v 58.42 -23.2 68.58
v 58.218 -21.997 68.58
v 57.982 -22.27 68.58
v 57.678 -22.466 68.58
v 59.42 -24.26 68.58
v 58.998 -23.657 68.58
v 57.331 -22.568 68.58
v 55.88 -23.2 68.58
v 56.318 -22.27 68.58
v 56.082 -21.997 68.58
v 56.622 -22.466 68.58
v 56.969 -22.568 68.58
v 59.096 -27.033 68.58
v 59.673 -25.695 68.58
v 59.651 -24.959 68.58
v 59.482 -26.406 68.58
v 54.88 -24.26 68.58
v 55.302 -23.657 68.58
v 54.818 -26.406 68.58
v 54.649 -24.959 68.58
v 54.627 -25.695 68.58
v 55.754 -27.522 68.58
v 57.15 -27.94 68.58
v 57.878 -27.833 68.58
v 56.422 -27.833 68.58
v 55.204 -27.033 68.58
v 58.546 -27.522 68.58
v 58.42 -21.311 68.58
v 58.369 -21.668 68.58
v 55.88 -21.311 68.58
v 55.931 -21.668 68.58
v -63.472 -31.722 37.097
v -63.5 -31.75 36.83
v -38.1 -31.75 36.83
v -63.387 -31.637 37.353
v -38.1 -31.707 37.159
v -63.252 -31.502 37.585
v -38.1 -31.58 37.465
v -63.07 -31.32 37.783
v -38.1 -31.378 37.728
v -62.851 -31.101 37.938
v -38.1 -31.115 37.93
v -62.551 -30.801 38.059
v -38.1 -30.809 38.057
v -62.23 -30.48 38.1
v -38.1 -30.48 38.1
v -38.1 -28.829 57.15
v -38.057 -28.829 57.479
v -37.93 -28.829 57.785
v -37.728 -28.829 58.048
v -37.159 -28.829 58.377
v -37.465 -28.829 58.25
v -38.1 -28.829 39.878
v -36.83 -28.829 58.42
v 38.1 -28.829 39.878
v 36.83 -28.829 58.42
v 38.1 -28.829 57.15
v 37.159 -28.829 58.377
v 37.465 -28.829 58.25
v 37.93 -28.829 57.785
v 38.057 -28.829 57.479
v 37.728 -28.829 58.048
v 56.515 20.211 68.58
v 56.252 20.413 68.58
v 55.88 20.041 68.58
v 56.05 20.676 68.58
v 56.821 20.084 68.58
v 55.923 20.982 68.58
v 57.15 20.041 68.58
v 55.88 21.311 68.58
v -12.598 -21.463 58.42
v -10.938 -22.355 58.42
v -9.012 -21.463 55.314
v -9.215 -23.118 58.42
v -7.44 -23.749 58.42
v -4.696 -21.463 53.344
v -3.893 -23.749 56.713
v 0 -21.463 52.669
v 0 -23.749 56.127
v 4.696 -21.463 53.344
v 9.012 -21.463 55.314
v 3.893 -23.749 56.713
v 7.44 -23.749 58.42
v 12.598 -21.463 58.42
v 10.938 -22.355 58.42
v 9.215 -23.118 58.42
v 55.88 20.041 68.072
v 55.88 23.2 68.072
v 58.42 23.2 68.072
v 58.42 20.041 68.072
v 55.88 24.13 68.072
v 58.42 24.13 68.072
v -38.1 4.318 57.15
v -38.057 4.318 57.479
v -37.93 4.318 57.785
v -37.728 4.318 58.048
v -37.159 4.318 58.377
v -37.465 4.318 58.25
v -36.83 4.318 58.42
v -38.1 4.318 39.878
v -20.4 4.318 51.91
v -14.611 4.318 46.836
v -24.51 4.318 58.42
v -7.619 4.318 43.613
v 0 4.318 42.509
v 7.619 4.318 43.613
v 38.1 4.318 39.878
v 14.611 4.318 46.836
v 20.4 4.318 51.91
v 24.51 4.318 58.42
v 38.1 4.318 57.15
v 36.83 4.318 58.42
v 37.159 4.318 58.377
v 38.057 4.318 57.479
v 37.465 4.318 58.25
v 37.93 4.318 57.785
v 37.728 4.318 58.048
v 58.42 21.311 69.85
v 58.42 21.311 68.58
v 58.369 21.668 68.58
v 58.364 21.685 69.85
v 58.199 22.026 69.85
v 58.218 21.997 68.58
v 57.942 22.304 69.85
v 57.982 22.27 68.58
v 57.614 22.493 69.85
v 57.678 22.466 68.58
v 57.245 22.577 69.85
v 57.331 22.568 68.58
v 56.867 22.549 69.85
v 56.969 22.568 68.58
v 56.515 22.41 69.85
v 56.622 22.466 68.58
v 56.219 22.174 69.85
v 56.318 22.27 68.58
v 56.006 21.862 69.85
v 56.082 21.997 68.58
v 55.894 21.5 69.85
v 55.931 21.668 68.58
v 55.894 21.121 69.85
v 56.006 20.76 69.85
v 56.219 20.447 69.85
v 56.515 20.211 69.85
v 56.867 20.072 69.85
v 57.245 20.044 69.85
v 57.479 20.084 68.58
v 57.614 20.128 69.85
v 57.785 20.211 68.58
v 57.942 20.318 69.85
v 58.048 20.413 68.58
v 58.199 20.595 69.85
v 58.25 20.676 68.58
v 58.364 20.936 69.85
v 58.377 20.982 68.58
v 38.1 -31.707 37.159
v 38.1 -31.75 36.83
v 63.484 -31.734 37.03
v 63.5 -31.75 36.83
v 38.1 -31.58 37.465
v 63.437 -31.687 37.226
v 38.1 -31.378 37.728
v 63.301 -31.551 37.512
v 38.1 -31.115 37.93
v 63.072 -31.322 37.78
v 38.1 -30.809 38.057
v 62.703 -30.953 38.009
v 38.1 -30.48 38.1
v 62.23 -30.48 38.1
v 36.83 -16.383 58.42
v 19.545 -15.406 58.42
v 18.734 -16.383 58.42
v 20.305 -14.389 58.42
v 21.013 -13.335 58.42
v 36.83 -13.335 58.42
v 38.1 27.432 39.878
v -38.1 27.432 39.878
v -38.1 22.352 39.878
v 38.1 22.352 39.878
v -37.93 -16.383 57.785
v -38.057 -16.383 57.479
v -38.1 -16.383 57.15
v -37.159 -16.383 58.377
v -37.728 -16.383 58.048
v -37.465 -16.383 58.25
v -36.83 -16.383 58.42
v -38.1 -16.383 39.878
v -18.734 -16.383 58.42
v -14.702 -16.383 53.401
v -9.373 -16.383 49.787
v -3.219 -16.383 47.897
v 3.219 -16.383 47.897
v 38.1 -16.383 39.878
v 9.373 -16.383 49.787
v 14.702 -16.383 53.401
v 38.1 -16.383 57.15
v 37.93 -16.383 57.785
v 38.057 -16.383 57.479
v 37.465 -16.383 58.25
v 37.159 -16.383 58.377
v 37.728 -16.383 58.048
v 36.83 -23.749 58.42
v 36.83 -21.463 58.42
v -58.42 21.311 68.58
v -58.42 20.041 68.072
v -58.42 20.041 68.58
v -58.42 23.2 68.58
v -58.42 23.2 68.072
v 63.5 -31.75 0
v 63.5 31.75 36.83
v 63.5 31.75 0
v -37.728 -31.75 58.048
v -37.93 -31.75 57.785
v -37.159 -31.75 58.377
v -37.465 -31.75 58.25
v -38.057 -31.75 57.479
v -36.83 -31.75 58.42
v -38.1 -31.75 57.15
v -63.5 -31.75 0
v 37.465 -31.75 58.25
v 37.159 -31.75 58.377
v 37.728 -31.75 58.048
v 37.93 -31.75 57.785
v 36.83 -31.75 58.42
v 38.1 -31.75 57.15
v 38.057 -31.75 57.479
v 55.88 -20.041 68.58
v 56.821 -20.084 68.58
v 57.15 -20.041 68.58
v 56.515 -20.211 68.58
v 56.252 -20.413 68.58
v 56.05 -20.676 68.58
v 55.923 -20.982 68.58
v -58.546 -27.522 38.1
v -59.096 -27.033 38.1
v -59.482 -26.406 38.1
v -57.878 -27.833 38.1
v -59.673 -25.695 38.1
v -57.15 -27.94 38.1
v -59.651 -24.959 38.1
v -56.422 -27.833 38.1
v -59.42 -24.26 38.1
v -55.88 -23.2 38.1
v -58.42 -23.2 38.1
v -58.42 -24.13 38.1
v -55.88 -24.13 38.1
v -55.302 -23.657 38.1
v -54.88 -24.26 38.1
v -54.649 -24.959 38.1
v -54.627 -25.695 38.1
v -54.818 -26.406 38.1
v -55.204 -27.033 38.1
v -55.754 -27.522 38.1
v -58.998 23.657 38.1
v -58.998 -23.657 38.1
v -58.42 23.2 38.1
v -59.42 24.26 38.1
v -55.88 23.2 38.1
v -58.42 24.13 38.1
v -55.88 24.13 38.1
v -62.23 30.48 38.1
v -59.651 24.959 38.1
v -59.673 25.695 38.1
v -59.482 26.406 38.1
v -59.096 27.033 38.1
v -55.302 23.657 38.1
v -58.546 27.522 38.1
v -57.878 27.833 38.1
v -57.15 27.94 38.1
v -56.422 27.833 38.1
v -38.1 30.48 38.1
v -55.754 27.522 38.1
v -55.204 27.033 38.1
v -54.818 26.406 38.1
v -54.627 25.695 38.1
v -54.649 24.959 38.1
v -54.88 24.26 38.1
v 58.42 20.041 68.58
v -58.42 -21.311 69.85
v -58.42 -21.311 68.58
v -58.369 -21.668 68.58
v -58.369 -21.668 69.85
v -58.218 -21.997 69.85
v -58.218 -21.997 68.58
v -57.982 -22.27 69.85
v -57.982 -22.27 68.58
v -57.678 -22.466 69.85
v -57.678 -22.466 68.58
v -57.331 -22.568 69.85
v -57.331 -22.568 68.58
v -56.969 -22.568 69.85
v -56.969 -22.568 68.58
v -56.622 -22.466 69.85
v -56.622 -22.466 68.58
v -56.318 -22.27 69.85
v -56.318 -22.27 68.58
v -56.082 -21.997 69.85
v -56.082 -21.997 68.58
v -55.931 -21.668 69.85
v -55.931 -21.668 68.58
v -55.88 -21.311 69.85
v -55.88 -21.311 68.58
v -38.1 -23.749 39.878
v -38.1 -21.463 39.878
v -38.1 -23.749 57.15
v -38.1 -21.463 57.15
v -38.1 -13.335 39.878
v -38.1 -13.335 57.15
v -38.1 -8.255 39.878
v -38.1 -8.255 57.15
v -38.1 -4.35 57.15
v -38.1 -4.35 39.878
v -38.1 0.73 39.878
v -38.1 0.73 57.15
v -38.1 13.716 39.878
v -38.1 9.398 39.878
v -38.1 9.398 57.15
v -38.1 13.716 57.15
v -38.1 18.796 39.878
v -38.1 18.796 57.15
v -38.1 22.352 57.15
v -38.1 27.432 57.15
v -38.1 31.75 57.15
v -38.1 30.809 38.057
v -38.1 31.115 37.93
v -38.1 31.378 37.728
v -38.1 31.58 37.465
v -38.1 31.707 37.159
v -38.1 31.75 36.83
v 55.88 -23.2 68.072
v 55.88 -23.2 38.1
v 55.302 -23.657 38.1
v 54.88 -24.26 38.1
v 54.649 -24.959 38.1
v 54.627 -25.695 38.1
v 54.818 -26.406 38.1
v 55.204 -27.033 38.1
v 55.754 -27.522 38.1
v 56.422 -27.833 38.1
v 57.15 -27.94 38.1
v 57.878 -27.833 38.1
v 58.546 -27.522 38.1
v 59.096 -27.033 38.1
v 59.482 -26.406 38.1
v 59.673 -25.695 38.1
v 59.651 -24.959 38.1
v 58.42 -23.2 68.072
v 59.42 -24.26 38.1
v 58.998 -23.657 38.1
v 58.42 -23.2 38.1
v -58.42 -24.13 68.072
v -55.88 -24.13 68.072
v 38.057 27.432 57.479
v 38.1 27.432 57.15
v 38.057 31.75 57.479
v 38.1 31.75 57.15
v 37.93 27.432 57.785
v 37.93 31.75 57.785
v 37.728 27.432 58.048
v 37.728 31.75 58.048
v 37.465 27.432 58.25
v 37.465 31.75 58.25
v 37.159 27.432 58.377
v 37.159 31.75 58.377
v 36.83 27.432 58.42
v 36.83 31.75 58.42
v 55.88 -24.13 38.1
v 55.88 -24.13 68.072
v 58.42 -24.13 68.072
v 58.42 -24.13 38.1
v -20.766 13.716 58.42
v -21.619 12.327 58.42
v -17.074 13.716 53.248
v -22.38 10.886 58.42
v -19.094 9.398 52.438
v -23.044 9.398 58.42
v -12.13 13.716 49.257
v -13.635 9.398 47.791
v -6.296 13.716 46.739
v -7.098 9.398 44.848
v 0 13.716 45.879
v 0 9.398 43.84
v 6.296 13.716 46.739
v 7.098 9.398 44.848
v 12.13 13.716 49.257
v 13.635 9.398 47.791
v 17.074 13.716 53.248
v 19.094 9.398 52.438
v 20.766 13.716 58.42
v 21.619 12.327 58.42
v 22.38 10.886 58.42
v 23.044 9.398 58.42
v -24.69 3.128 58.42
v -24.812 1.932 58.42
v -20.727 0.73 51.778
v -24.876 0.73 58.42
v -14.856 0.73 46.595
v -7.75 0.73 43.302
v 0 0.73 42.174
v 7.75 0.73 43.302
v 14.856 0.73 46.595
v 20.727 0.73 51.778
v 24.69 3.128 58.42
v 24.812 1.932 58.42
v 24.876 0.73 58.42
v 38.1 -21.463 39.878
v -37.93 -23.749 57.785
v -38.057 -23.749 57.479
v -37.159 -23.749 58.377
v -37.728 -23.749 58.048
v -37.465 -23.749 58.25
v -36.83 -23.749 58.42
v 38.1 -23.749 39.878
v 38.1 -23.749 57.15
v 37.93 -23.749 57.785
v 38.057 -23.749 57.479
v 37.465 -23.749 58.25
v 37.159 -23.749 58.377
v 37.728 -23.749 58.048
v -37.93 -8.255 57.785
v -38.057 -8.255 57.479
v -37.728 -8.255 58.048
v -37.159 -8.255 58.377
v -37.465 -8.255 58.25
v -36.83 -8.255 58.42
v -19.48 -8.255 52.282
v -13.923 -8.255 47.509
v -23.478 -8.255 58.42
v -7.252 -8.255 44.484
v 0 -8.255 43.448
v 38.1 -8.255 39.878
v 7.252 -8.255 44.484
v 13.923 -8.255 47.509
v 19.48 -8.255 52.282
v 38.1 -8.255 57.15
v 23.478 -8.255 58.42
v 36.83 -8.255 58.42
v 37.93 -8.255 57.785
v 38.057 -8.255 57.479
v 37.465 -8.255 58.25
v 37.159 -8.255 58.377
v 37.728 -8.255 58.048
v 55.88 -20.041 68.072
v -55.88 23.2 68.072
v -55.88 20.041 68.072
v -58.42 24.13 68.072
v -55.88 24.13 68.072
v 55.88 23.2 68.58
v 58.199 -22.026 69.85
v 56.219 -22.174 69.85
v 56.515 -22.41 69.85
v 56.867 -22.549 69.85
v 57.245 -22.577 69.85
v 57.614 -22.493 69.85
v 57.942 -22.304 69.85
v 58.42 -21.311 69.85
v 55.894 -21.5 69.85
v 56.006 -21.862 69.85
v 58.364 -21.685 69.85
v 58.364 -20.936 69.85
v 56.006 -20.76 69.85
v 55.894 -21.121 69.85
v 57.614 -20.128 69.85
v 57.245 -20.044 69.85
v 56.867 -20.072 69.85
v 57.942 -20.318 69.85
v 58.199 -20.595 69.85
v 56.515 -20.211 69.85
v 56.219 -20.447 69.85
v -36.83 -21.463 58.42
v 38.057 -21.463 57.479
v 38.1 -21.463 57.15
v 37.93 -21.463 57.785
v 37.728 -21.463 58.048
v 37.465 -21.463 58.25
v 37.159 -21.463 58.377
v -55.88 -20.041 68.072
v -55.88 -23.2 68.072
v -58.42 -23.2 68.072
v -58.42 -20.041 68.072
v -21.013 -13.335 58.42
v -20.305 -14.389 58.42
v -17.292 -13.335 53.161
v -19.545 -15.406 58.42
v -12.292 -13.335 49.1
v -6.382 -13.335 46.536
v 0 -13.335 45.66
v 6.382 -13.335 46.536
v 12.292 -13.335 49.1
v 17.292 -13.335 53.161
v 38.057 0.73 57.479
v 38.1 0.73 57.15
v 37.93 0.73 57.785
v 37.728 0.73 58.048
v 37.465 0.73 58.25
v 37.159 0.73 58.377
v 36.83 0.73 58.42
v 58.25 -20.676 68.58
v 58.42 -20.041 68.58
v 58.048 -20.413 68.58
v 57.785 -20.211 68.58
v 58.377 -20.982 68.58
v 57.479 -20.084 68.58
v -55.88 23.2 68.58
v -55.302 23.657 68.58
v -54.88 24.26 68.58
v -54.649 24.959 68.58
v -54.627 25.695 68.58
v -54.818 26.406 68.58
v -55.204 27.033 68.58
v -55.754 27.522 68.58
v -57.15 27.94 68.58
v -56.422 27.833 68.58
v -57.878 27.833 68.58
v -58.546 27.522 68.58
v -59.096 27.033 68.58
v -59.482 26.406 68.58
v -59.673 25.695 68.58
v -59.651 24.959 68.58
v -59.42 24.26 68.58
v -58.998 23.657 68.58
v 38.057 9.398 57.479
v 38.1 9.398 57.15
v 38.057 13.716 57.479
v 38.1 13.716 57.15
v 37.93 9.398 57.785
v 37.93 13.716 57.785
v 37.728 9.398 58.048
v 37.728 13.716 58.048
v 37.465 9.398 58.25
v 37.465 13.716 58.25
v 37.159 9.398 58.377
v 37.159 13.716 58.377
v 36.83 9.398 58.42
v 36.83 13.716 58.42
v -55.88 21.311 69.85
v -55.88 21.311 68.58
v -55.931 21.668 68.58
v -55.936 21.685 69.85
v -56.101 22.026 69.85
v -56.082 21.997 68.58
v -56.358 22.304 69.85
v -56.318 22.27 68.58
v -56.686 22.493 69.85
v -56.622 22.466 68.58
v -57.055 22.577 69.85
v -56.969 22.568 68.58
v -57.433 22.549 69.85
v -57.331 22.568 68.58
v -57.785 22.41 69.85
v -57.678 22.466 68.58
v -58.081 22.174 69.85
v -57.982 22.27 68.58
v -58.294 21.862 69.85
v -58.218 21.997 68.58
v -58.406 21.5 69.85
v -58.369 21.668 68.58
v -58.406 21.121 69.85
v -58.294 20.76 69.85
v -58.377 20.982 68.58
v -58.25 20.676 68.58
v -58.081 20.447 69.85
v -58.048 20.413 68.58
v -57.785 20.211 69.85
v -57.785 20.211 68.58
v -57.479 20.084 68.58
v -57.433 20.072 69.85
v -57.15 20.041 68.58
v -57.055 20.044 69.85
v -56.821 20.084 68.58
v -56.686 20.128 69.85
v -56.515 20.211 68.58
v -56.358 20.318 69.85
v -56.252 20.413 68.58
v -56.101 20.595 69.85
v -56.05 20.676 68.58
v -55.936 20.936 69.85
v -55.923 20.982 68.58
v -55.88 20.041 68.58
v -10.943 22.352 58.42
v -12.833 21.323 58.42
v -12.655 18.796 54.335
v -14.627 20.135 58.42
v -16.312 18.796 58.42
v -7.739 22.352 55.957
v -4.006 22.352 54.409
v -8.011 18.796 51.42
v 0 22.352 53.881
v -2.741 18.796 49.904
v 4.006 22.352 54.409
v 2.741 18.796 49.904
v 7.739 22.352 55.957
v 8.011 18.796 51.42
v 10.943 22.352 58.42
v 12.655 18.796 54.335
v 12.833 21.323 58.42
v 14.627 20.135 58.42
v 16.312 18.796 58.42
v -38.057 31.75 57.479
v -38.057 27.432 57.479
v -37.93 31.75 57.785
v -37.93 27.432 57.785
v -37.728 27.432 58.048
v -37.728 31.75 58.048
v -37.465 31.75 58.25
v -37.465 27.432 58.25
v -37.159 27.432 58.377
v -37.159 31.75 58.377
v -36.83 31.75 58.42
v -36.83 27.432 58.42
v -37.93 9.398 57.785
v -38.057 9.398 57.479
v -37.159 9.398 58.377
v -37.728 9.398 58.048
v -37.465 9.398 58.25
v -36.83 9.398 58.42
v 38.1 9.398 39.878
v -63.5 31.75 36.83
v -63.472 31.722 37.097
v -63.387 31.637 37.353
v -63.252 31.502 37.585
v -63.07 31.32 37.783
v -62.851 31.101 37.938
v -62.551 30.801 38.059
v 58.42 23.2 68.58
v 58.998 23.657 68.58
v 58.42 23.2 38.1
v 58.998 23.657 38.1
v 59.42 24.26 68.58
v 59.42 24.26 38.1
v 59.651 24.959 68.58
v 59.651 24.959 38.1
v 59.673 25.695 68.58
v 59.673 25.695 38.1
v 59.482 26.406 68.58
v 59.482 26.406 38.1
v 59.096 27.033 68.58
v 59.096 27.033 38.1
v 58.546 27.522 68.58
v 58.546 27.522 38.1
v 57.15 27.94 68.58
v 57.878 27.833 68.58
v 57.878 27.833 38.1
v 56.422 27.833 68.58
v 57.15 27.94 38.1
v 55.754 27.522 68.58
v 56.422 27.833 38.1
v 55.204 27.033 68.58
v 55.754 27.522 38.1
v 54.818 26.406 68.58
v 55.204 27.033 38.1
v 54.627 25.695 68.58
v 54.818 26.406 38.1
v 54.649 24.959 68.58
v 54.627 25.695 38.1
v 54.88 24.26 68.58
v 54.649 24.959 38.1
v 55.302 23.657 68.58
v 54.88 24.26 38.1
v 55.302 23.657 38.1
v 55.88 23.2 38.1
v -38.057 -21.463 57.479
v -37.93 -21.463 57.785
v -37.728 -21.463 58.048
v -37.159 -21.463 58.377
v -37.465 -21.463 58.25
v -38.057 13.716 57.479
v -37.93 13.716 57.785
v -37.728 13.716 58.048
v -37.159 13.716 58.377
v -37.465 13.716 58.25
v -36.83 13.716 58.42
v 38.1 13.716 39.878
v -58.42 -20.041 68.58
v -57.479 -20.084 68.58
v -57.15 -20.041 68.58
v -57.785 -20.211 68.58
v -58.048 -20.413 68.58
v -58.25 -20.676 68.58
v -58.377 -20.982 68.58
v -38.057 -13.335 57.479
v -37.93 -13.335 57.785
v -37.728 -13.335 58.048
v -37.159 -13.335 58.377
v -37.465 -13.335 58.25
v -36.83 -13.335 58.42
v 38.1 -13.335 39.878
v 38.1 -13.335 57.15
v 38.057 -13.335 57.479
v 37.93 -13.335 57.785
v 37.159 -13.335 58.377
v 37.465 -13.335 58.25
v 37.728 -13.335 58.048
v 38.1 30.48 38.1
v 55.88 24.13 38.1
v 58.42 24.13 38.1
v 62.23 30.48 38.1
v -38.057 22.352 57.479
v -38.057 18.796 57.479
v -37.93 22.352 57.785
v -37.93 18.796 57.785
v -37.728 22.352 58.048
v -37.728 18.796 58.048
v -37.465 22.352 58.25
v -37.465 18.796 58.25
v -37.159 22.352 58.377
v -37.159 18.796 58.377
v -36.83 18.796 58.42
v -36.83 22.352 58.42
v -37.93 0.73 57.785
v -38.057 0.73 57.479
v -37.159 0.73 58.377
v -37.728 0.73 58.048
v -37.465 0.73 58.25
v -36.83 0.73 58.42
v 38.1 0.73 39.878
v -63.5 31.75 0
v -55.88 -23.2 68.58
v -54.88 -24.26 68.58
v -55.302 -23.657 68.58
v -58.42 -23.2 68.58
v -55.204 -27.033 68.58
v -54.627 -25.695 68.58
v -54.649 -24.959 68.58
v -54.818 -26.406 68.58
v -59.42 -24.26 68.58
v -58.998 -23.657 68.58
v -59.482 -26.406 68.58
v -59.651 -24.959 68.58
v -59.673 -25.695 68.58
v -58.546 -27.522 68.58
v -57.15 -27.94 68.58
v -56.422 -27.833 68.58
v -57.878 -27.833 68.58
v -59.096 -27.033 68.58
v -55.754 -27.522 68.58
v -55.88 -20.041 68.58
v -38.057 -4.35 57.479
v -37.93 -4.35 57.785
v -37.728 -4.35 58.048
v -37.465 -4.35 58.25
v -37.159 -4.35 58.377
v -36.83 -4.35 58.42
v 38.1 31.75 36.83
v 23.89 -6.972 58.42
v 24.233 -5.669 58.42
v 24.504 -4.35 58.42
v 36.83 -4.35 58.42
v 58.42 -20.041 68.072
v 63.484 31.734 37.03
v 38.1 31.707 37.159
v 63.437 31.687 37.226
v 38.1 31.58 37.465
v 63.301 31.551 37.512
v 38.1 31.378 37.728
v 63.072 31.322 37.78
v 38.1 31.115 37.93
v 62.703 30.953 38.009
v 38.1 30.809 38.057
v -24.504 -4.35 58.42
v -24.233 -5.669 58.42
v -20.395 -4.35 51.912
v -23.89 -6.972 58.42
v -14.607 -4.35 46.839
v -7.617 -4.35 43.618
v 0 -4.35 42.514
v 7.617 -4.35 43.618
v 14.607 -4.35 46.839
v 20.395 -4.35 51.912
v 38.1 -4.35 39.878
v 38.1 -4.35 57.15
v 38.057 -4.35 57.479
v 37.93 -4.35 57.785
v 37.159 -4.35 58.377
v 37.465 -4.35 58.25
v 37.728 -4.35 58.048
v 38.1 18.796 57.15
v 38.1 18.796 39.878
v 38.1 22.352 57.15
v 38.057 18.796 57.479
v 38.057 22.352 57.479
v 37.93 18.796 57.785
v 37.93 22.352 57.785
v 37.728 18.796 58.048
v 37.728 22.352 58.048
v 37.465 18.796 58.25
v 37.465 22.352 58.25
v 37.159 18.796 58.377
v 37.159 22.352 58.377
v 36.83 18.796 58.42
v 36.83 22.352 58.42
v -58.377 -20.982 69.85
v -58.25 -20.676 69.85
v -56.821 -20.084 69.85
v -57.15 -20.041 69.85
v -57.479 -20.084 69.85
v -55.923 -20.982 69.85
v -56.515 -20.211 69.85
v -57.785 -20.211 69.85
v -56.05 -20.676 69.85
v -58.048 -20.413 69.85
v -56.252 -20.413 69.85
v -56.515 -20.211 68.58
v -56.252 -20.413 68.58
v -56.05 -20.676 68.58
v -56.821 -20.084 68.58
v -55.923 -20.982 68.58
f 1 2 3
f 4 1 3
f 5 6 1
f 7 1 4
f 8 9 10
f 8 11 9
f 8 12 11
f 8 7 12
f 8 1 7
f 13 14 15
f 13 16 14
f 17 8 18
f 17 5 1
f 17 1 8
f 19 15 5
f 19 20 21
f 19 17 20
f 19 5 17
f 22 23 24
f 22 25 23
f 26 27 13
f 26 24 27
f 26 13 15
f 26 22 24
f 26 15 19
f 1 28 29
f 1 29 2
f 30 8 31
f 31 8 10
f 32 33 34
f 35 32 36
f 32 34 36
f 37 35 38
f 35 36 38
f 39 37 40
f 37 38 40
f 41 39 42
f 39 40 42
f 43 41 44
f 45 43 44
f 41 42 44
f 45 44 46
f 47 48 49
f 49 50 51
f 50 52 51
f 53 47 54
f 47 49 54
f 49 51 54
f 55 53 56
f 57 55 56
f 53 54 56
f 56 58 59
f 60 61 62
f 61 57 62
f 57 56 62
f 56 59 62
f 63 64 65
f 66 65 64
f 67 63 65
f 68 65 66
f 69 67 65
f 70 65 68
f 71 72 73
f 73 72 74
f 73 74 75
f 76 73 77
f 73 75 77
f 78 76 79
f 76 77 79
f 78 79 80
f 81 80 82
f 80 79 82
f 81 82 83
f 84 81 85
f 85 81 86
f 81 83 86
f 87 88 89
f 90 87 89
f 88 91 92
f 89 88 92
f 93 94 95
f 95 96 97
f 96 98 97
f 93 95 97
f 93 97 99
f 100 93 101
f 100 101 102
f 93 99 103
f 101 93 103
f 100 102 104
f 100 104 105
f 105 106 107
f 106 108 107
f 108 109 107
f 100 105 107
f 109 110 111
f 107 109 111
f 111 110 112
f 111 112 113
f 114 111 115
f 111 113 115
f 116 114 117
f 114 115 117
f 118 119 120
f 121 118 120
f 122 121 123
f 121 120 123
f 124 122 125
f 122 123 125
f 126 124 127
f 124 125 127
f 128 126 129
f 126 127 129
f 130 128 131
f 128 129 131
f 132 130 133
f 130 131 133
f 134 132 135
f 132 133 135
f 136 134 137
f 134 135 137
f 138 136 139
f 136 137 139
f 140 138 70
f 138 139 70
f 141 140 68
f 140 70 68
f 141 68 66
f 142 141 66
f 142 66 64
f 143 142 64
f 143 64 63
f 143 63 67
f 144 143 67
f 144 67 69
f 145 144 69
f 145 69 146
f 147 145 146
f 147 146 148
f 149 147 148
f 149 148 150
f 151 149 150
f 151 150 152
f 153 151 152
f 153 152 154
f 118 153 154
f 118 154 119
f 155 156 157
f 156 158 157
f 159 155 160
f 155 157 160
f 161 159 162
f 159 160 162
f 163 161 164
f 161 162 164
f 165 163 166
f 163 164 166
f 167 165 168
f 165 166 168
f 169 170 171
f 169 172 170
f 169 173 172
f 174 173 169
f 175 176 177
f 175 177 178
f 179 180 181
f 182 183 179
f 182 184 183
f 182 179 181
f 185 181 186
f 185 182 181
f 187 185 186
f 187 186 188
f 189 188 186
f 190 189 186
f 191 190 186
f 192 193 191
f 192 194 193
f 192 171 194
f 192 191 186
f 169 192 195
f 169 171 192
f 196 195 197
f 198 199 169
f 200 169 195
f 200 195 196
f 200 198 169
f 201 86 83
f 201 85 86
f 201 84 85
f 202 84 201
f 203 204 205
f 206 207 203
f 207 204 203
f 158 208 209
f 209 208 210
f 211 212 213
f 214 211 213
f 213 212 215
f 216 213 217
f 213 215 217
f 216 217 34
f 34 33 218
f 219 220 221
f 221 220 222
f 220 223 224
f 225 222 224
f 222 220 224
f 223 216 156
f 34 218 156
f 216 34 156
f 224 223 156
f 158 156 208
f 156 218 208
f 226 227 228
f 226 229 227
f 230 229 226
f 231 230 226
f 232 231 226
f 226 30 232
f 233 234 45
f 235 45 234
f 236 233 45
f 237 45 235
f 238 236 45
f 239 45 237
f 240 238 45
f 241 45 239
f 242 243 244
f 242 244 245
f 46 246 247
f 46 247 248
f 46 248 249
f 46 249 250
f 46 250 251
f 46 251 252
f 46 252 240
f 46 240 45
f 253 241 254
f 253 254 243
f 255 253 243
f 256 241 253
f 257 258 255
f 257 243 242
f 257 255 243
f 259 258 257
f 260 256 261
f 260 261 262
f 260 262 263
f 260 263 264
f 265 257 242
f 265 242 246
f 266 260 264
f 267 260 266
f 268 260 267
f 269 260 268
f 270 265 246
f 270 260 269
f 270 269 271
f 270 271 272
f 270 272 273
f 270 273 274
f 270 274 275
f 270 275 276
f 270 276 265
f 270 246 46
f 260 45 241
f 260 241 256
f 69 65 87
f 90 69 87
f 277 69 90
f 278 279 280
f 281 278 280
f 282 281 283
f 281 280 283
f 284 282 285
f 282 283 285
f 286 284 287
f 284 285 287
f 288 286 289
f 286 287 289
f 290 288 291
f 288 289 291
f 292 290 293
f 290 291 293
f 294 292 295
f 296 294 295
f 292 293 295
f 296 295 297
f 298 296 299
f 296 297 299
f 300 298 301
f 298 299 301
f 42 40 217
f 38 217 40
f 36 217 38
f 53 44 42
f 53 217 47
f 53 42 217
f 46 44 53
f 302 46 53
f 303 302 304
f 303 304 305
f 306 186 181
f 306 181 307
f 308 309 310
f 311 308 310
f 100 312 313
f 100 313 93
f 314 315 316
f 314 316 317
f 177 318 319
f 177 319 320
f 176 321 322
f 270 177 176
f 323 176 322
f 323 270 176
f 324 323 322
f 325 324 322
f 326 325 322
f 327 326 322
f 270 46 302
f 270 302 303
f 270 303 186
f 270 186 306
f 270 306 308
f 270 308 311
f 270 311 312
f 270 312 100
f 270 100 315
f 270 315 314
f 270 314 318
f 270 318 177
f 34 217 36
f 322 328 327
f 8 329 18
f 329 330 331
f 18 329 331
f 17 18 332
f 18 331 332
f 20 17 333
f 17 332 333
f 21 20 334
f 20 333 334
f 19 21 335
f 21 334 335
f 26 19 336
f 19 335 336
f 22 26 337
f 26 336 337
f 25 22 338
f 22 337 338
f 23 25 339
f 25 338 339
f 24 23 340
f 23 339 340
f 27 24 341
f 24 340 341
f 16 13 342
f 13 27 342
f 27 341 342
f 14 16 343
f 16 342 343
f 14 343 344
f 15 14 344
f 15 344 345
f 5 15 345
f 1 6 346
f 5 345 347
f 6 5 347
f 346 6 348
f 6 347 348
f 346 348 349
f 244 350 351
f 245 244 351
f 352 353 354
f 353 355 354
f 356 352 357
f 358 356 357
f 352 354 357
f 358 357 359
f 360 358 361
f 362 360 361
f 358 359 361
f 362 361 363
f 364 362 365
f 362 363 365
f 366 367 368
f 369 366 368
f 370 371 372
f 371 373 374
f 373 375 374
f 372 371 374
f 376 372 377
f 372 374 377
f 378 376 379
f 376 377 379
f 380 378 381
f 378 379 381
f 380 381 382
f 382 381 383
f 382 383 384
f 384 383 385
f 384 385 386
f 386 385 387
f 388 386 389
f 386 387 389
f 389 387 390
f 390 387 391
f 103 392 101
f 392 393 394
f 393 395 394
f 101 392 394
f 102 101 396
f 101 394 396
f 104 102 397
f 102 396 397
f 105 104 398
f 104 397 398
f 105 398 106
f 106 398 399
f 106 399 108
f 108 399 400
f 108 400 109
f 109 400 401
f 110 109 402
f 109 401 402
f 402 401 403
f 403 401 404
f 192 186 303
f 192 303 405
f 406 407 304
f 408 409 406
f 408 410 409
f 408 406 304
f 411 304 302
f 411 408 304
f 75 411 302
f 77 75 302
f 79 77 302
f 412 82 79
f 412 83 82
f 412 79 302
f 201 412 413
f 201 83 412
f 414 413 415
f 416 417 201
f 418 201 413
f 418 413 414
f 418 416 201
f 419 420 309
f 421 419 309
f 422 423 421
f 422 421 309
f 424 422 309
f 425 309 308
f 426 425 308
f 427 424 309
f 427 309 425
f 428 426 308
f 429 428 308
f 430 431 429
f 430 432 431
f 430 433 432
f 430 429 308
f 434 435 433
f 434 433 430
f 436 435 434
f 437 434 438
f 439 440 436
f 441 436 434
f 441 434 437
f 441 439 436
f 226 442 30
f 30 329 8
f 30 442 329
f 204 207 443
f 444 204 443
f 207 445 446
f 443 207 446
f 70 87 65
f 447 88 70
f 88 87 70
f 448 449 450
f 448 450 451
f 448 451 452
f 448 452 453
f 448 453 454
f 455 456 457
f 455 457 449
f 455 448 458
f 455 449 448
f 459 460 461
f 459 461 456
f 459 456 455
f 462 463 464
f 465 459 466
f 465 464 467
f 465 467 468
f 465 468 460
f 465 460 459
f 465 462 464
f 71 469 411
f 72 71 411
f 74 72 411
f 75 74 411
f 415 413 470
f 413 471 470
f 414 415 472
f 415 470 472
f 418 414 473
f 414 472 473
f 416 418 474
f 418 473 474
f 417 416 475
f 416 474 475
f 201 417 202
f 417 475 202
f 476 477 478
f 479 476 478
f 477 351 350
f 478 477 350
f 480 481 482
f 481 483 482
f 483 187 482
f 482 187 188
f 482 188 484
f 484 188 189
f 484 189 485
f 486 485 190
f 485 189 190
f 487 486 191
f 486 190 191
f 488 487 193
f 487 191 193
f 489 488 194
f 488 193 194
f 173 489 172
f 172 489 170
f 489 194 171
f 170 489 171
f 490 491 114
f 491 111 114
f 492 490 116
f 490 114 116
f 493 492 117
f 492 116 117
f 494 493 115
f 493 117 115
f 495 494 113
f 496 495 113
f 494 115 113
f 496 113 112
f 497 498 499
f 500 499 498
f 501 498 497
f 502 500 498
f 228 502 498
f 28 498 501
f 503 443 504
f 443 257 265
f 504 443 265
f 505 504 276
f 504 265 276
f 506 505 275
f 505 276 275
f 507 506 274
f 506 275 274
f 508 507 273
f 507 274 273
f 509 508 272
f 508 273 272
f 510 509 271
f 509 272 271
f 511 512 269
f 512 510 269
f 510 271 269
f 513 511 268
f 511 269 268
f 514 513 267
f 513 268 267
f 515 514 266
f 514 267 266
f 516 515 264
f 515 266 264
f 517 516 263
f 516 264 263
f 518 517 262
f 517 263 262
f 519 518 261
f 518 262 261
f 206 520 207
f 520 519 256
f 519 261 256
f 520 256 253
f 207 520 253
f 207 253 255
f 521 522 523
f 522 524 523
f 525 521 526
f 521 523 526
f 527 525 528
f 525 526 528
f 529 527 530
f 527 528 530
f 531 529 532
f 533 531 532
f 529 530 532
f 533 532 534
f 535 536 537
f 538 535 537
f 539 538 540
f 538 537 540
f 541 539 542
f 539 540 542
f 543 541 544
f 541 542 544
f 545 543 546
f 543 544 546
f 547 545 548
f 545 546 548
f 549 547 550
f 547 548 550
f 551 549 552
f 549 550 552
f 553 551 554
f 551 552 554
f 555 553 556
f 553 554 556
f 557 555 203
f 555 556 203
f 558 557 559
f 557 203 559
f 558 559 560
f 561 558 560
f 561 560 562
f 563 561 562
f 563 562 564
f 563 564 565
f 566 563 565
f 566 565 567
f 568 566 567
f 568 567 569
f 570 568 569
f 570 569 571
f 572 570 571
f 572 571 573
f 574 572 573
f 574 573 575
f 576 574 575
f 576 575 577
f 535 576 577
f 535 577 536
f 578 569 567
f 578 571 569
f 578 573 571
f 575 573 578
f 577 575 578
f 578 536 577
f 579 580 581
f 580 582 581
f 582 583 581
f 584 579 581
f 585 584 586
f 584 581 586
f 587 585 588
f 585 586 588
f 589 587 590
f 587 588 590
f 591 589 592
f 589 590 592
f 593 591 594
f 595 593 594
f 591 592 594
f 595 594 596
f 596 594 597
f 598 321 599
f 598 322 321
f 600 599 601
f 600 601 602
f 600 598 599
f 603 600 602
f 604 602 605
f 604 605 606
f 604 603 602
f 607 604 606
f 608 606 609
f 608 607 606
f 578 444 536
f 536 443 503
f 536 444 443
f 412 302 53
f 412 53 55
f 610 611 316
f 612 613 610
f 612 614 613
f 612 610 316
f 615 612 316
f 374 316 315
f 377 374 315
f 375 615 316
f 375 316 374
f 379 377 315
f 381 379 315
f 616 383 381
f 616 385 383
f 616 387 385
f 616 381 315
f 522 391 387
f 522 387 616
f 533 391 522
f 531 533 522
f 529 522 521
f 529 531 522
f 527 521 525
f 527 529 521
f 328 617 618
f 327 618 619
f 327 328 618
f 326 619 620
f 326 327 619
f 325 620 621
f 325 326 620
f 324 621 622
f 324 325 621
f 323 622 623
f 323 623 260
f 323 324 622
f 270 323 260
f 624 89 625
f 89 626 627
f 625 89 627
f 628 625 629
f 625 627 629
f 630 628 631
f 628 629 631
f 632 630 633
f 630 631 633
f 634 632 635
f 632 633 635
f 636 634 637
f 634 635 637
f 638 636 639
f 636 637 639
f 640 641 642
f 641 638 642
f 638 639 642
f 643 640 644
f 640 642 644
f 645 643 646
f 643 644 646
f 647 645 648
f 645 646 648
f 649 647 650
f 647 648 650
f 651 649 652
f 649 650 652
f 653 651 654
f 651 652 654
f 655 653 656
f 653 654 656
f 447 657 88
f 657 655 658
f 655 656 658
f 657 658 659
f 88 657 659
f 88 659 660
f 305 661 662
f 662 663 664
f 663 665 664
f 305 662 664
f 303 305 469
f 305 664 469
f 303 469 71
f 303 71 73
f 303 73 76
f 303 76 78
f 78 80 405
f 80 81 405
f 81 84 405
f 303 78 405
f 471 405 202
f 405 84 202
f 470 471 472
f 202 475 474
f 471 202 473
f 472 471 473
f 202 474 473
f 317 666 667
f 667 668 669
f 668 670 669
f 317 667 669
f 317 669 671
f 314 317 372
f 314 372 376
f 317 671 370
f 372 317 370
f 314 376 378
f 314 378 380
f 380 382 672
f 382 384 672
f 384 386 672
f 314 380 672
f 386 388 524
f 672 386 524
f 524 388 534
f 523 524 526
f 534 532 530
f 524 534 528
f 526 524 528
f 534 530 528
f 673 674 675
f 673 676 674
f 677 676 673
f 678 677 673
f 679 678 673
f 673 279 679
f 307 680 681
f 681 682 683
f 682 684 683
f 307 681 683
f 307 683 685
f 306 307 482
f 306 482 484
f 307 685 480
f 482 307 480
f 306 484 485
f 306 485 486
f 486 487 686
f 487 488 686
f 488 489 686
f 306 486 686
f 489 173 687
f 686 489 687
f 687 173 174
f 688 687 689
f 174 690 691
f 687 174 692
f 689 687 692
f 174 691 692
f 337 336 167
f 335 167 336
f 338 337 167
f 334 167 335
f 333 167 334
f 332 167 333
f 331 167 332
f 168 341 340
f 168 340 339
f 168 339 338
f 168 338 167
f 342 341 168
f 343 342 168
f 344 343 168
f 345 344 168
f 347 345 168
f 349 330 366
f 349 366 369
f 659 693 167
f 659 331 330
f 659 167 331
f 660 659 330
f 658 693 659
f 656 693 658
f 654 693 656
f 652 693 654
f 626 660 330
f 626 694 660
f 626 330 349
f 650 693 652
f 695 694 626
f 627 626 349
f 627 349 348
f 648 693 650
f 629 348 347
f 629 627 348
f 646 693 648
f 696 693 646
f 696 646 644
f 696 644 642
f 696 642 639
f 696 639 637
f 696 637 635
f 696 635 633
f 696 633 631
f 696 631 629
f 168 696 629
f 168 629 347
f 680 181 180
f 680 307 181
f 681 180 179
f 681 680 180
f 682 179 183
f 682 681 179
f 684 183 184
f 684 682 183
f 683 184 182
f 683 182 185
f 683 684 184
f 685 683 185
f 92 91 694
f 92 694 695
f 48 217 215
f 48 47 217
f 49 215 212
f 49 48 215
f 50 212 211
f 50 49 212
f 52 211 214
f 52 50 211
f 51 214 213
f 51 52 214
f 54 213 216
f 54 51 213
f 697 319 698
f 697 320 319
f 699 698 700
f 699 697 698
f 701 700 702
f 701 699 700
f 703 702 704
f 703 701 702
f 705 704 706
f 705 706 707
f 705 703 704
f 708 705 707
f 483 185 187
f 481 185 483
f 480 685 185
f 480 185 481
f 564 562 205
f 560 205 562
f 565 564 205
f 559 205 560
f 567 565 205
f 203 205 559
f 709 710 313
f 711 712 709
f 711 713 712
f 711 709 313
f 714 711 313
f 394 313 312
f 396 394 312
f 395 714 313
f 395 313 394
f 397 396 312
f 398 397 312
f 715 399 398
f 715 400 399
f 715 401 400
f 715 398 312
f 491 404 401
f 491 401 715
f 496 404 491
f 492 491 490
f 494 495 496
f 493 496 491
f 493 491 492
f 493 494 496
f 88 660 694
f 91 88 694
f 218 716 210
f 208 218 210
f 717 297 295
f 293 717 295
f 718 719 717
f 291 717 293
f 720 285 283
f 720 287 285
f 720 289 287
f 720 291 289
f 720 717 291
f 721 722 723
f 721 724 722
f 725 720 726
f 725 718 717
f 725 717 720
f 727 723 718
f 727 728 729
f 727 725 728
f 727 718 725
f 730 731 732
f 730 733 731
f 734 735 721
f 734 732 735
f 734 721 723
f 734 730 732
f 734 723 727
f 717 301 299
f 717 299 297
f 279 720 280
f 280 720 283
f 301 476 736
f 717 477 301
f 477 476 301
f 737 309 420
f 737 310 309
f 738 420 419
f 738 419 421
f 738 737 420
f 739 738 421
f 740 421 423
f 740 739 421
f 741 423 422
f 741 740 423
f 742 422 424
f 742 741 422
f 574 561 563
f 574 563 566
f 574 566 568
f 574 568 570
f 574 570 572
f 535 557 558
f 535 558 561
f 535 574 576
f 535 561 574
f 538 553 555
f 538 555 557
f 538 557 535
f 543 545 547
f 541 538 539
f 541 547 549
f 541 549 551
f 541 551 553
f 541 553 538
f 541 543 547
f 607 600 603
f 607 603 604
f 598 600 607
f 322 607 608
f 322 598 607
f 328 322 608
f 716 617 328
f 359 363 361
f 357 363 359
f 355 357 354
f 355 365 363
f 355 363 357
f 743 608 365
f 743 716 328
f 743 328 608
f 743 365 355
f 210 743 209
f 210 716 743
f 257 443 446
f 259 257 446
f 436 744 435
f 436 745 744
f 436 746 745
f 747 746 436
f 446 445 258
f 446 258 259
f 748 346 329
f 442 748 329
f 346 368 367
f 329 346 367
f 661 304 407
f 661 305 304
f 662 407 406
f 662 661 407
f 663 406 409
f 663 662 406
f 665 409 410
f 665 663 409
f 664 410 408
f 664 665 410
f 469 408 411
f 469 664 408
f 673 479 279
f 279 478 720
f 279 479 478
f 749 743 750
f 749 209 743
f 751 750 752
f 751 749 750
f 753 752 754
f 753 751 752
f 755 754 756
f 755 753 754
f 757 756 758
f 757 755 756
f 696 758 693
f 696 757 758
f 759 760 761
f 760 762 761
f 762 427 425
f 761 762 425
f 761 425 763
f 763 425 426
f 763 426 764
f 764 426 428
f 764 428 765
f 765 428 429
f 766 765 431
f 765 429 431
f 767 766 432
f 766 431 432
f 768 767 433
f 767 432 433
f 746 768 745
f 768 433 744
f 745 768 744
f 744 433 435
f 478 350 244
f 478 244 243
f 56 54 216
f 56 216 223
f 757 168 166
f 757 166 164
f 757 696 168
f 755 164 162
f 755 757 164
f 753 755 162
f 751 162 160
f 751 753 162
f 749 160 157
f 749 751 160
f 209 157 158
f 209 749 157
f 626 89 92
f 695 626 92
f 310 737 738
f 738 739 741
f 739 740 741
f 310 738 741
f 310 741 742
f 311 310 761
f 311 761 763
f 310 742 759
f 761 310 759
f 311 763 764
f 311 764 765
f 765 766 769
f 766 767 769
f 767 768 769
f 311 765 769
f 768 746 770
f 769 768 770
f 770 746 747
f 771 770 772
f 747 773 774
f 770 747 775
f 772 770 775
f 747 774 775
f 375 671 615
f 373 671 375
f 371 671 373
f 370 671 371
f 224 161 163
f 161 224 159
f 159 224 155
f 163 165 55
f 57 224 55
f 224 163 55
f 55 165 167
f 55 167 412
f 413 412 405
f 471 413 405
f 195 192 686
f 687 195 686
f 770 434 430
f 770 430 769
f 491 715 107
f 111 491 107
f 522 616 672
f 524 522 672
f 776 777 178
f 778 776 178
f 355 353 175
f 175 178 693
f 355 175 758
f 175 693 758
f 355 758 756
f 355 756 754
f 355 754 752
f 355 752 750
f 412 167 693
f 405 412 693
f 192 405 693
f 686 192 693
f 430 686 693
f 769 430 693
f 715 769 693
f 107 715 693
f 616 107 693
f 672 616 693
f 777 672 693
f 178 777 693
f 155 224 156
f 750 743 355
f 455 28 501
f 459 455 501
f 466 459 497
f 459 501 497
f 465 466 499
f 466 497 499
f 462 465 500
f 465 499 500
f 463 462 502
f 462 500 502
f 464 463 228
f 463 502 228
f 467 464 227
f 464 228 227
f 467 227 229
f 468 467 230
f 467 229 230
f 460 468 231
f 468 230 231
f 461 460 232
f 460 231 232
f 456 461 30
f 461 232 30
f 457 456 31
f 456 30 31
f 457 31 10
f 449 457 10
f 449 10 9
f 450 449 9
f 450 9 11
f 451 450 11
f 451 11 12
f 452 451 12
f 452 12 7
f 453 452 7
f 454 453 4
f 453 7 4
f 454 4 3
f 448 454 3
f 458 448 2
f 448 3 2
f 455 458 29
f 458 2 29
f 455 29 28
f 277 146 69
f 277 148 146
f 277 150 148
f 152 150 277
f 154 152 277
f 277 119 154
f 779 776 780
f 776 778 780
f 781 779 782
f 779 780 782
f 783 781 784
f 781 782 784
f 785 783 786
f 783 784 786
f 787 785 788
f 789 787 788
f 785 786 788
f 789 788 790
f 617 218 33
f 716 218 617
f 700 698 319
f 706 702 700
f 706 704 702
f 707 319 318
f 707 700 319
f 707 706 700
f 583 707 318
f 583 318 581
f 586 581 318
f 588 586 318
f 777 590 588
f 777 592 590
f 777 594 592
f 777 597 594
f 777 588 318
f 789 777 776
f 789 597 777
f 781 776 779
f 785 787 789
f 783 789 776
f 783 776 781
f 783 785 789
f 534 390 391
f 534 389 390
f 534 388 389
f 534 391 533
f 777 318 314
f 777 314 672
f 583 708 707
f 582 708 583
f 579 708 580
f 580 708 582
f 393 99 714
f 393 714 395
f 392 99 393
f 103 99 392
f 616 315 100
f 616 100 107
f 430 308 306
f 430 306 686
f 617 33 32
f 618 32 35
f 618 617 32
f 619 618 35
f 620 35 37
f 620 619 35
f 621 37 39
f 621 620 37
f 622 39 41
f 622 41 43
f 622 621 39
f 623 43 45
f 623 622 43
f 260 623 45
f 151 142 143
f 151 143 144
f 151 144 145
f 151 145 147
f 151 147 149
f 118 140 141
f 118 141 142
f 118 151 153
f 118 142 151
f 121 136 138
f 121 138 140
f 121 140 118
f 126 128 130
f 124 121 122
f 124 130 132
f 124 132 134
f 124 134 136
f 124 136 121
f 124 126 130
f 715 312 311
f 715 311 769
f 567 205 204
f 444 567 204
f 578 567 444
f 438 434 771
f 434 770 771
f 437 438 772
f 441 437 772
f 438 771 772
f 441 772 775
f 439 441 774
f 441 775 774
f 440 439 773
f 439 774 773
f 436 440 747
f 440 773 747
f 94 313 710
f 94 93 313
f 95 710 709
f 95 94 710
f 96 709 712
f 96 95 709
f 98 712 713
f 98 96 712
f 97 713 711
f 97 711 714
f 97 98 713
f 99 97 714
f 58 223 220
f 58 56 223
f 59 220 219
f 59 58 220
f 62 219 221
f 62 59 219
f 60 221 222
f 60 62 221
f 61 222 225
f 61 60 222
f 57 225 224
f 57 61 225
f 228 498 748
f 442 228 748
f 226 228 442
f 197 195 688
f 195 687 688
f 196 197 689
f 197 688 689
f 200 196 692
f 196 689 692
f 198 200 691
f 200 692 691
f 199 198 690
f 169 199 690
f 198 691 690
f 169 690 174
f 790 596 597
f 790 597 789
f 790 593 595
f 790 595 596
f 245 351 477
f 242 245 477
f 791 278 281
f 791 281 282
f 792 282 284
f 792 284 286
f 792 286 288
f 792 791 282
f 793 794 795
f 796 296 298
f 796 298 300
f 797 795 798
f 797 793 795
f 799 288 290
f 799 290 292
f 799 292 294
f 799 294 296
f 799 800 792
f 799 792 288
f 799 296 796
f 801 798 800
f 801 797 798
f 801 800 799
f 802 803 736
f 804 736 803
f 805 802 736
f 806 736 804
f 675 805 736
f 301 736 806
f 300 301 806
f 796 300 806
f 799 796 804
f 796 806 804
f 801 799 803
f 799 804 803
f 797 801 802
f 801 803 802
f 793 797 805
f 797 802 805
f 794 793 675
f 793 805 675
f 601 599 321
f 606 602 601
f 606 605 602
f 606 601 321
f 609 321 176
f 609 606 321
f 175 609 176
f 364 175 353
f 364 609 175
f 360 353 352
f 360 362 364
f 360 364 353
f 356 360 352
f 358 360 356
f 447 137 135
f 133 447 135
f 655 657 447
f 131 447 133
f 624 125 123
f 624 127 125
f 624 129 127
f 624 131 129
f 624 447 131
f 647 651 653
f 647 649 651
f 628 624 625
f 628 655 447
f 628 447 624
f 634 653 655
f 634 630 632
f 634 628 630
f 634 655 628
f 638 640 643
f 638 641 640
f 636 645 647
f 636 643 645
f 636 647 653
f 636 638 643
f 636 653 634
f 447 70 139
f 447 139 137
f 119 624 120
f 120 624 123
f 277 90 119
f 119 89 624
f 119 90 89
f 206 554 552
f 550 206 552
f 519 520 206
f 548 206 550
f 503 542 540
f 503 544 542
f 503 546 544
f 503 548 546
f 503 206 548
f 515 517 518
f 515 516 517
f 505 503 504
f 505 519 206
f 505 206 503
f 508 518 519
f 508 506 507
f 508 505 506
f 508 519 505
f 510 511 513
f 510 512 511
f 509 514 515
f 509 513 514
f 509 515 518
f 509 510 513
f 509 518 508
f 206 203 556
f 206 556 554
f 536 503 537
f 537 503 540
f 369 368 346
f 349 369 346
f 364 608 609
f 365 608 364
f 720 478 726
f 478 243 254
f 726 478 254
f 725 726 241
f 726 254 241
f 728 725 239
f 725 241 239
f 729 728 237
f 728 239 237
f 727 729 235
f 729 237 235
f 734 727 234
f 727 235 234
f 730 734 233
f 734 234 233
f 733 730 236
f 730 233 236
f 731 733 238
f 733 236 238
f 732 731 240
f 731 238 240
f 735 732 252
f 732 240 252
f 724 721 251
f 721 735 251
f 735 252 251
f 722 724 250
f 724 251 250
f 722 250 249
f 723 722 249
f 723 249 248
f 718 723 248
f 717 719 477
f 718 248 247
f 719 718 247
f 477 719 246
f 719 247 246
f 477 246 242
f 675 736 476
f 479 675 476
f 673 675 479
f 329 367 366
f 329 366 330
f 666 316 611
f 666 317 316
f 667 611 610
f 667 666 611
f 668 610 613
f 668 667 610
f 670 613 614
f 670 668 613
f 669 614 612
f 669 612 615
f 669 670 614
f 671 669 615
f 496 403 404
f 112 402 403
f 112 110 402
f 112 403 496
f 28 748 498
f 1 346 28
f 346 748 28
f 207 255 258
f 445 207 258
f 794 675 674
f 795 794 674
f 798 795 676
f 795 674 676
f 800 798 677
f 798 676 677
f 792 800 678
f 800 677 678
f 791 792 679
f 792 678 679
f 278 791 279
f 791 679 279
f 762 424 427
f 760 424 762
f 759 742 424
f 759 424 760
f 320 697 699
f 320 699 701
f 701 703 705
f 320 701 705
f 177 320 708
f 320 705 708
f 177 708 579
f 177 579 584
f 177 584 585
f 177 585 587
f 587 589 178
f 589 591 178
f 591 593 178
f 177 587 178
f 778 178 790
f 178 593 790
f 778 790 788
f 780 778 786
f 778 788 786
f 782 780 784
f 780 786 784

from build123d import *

# Parameters (mm, degrees)
F0_W      = 127
F0_H      = 63.5
F1_DEPTH  = 38.1
F2_W      = 76.2
F2_H      = 63.5
F3_DEPTH  = 20.32
F5_W      = 85.9366810061
F5_H      = 5.08
F6_DEPTH  = 34.798
F7_R      = 1.27
F12_R     = 2.54
F13_DEPTH = 30.48
F14_R     = 2.54
F15_DEPTH = 30.48
F17_W     = 2.54
F17_H     = 48.26
F18_DEPTH = 30.734
F19_W     = 2.54
F19_H     = 0.508
F20_DEPTH = 4.0894
F21_R     = 1.27
F22_DEPTH = 1.27
F23_W     = 2.54
F23_H     = 0.508
F24_DEPTH = 4.0894
F26_DEPTH = 1.27
F27_W     = 2.54
F27_H     = 0.508
F28_DEPTH = 4.0894
F29_R     = 1.27
F30_DEPTH = 1.27
F31_W     = 2.54
F31_H     = 0.508
F32_DEPTH = 4.0894
F33_R     = 1.27
F34_DEPTH = 1.27


with BuildPart() as f1:
    # F0 (on Top) → F1 (new body)
    with BuildSketch(Plane.XY):
        Rectangle(F0_W, F0_H)
    extrude(amount=F1_DEPTH)

    # F2 (on face) → F3 (join)
    with BuildSketch(Plane.XY.offset(38.1)):
        Rectangle(F2_W, F2_H)
    extrude(amount=F3_DEPTH)

    # F5 (on offset) → F6 (cut)
    with BuildSketch(Plane.XY.offset(74.676)):
        with Locations((1.5557501465, 24.8920014128)):
            Rectangle(F5_W, F5_H)
        with Locations((1.9367600847, 16.255996407)):
            Rectangle(F5_W, F5_H)
        with Locations((1.9685070086, 6.8579998174)):
            Rectangle(F5_W, F5_H)
        with Locations((2.1590034533, -1.8097495353)):
            Rectangle(F5_W, F5_H)
        with Locations((2.7622657884, -10.7949979296)):
            Rectangle(F5_W, F5_H)
        with Locations((2.2860284019, -18.9229918337)):
            Rectangle(F5_W, F5_H)
        with Locations((2.4130123723, -26.288997165)):
            Rectangle(F5_W, F5_H)
    extrude(amount=-F6_DEPTH, mode=Mode.SUBTRACT)

    # F7
    f7_edges = [f1.edges().sort_by_distance(p)[0] for p in [
        (-63.5, 0, 38.1),
        (-50.8, -31.75, 38.1),
        (-38.1, -6.302374, 58.42),
        (-38.1, -14.858995, 58.42),
        (-38.1, -30.289499, 58.42),
        (-38.1, -22.605994, 58.42),
        (-38.1, 11.556998, 58.42),
        (-38.1, 20.573999, 58.42),
        (-38.1, 29.591001, 58.42),
        (-38.1, 2.524125, 58.42),
        (-50.8, 31.75, 38.1),
        (63.5, 0, 38.1),
        (50.8, 31.75, 38.1),
        (50.8, -31.75, 38.1),
        (38.1, 2.524125, 58.42),
        (38.1, 11.556998, 58.42),
        (38.1, 20.573999, 58.42),
        (38.1, 29.591001, 58.42),
        (38.1, -6.302374, 58.42),
        (38.1, -14.858995, 58.42),
        (38.1, -22.605994, 58.42),
        (38.1, -30.289499, 58.42),
    ]]
    fillet(f7_edges, radius=F7_R)

    # F9 (on offset) → F11 (revolve, cut)
    with BuildSketch(Plane.XY.offset(69.342)):
        with BuildLine():
            Line((0, -27.1781864281), (0, 27.1781864281))
            ThreePointArc((0, 27.1781864281), (-27.1781864281, 0), (0, -27.1781864281))
        make_face()
    revolve(axis=Axis((0, 0.2222489566, 69.342), (0, -1, 0)), mode=Mode.SUBTRACT)

    # F12 (on face) → F13 (join)
    with BuildSketch(Plane.XY.offset(38.1)):
        with Locations((-57.15, 25.4)):
            Circle(F12_R)
        with Locations((-57.15, -25.4)):
            Circle(F12_R)
    extrude(amount=F13_DEPTH)

    # F14 (on face) → F15 (join)
    with BuildSketch(Plane.XY.offset(38.1)):
        with Locations((57.15, 25.4)):
            Circle(F14_R)
        with Locations((57.15, -25.4)):
            Circle(F14_R)
    extrude(amount=F15_DEPTH)

    # F17 (on offset) → F18 (cut)
    with BuildSketch(Plane.XY.offset(68.834)):
        with Locations((-57.15, 0)):
            Rectangle(F17_W, F17_H)
        with Locations((57.15, 0)):
            Rectangle(F17_W, F17_H)
    extrude(amount=-F18_DEPTH, mode=Mode.SUBTRACT)

    # F19 (on face) → F20 (join)
    with BuildSketch(Plane.XZ.offset(-24.13)):
        with Locations((-57.15, 68.326)):
            Rectangle(F19_W, F19_H)
    extrude(amount=F20_DEPTH)

    # F21 (on face) → F22 (join)
    with BuildSketch(Plane.XY.offset(68.58)):
        with Locations((-57.15, 21.3106)):
            Circle(F21_R)
    extrude(amount=F22_DEPTH)

    # F23 (on face) → F24 (join)
    with BuildSketch(Plane(origin=(0, -24.13, 0), x_dir=(-1, 0, 0), z_dir=(0, 1, 0))):
        with Locations((57.15, 68.326)):
            Rectangle(F23_W, F23_H)
    extrude(amount=F24_DEPTH)

    # F25 (on face) → F26 (join)
    with BuildSketch(Plane.XY.offset(68.58)):
        with BuildLine():
            ThreePointArc((-58.42, -21.3106), (-57.15, -22.5806), (-55.88, -21.3106))
            ThreePointArc((-55.88, -21.3106), (-56.2519743879, -20.4125743879), (-57.15, -20.0406))
            ThreePointArc((-57.15, -20.0406), (-58.0480256121, -20.4125743879), (-58.42, -21.3106))
        make_face()
    extrude(amount=F26_DEPTH)

    # F27 (on face) → F28 (join)
    with BuildSketch(Plane.XZ.offset(-24.13)):
        with Locations((57.15, 68.326)):
            Rectangle(F27_W, F27_H)
    extrude(amount=F28_DEPTH)

    # F29 (on face) → F30 (join)
    with BuildSketch(Plane.XY.offset(68.58)):
        with Locations((57.15, 21.3106)):
            Circle(F29_R)
    extrude(amount=F30_DEPTH)

    # F31 (on face) → F32 (join)
    with BuildSketch(Plane(origin=(0, -24.13, 0), x_dir=(-1, 0, 0), z_dir=(0, 1, 0))):
        with Locations((-57.15, 68.326)):
            Rectangle(F31_W, F31_H)
    extrude(amount=F32_DEPTH)

    # F33 (on face) → F34 (join)
    with BuildSketch(Plane.XY.offset(68.58)):
        with Locations((57.15, -21.3106)):
            Circle(F33_R)
    extrude(amount=F34_DEPTH)


solid = f1.part
